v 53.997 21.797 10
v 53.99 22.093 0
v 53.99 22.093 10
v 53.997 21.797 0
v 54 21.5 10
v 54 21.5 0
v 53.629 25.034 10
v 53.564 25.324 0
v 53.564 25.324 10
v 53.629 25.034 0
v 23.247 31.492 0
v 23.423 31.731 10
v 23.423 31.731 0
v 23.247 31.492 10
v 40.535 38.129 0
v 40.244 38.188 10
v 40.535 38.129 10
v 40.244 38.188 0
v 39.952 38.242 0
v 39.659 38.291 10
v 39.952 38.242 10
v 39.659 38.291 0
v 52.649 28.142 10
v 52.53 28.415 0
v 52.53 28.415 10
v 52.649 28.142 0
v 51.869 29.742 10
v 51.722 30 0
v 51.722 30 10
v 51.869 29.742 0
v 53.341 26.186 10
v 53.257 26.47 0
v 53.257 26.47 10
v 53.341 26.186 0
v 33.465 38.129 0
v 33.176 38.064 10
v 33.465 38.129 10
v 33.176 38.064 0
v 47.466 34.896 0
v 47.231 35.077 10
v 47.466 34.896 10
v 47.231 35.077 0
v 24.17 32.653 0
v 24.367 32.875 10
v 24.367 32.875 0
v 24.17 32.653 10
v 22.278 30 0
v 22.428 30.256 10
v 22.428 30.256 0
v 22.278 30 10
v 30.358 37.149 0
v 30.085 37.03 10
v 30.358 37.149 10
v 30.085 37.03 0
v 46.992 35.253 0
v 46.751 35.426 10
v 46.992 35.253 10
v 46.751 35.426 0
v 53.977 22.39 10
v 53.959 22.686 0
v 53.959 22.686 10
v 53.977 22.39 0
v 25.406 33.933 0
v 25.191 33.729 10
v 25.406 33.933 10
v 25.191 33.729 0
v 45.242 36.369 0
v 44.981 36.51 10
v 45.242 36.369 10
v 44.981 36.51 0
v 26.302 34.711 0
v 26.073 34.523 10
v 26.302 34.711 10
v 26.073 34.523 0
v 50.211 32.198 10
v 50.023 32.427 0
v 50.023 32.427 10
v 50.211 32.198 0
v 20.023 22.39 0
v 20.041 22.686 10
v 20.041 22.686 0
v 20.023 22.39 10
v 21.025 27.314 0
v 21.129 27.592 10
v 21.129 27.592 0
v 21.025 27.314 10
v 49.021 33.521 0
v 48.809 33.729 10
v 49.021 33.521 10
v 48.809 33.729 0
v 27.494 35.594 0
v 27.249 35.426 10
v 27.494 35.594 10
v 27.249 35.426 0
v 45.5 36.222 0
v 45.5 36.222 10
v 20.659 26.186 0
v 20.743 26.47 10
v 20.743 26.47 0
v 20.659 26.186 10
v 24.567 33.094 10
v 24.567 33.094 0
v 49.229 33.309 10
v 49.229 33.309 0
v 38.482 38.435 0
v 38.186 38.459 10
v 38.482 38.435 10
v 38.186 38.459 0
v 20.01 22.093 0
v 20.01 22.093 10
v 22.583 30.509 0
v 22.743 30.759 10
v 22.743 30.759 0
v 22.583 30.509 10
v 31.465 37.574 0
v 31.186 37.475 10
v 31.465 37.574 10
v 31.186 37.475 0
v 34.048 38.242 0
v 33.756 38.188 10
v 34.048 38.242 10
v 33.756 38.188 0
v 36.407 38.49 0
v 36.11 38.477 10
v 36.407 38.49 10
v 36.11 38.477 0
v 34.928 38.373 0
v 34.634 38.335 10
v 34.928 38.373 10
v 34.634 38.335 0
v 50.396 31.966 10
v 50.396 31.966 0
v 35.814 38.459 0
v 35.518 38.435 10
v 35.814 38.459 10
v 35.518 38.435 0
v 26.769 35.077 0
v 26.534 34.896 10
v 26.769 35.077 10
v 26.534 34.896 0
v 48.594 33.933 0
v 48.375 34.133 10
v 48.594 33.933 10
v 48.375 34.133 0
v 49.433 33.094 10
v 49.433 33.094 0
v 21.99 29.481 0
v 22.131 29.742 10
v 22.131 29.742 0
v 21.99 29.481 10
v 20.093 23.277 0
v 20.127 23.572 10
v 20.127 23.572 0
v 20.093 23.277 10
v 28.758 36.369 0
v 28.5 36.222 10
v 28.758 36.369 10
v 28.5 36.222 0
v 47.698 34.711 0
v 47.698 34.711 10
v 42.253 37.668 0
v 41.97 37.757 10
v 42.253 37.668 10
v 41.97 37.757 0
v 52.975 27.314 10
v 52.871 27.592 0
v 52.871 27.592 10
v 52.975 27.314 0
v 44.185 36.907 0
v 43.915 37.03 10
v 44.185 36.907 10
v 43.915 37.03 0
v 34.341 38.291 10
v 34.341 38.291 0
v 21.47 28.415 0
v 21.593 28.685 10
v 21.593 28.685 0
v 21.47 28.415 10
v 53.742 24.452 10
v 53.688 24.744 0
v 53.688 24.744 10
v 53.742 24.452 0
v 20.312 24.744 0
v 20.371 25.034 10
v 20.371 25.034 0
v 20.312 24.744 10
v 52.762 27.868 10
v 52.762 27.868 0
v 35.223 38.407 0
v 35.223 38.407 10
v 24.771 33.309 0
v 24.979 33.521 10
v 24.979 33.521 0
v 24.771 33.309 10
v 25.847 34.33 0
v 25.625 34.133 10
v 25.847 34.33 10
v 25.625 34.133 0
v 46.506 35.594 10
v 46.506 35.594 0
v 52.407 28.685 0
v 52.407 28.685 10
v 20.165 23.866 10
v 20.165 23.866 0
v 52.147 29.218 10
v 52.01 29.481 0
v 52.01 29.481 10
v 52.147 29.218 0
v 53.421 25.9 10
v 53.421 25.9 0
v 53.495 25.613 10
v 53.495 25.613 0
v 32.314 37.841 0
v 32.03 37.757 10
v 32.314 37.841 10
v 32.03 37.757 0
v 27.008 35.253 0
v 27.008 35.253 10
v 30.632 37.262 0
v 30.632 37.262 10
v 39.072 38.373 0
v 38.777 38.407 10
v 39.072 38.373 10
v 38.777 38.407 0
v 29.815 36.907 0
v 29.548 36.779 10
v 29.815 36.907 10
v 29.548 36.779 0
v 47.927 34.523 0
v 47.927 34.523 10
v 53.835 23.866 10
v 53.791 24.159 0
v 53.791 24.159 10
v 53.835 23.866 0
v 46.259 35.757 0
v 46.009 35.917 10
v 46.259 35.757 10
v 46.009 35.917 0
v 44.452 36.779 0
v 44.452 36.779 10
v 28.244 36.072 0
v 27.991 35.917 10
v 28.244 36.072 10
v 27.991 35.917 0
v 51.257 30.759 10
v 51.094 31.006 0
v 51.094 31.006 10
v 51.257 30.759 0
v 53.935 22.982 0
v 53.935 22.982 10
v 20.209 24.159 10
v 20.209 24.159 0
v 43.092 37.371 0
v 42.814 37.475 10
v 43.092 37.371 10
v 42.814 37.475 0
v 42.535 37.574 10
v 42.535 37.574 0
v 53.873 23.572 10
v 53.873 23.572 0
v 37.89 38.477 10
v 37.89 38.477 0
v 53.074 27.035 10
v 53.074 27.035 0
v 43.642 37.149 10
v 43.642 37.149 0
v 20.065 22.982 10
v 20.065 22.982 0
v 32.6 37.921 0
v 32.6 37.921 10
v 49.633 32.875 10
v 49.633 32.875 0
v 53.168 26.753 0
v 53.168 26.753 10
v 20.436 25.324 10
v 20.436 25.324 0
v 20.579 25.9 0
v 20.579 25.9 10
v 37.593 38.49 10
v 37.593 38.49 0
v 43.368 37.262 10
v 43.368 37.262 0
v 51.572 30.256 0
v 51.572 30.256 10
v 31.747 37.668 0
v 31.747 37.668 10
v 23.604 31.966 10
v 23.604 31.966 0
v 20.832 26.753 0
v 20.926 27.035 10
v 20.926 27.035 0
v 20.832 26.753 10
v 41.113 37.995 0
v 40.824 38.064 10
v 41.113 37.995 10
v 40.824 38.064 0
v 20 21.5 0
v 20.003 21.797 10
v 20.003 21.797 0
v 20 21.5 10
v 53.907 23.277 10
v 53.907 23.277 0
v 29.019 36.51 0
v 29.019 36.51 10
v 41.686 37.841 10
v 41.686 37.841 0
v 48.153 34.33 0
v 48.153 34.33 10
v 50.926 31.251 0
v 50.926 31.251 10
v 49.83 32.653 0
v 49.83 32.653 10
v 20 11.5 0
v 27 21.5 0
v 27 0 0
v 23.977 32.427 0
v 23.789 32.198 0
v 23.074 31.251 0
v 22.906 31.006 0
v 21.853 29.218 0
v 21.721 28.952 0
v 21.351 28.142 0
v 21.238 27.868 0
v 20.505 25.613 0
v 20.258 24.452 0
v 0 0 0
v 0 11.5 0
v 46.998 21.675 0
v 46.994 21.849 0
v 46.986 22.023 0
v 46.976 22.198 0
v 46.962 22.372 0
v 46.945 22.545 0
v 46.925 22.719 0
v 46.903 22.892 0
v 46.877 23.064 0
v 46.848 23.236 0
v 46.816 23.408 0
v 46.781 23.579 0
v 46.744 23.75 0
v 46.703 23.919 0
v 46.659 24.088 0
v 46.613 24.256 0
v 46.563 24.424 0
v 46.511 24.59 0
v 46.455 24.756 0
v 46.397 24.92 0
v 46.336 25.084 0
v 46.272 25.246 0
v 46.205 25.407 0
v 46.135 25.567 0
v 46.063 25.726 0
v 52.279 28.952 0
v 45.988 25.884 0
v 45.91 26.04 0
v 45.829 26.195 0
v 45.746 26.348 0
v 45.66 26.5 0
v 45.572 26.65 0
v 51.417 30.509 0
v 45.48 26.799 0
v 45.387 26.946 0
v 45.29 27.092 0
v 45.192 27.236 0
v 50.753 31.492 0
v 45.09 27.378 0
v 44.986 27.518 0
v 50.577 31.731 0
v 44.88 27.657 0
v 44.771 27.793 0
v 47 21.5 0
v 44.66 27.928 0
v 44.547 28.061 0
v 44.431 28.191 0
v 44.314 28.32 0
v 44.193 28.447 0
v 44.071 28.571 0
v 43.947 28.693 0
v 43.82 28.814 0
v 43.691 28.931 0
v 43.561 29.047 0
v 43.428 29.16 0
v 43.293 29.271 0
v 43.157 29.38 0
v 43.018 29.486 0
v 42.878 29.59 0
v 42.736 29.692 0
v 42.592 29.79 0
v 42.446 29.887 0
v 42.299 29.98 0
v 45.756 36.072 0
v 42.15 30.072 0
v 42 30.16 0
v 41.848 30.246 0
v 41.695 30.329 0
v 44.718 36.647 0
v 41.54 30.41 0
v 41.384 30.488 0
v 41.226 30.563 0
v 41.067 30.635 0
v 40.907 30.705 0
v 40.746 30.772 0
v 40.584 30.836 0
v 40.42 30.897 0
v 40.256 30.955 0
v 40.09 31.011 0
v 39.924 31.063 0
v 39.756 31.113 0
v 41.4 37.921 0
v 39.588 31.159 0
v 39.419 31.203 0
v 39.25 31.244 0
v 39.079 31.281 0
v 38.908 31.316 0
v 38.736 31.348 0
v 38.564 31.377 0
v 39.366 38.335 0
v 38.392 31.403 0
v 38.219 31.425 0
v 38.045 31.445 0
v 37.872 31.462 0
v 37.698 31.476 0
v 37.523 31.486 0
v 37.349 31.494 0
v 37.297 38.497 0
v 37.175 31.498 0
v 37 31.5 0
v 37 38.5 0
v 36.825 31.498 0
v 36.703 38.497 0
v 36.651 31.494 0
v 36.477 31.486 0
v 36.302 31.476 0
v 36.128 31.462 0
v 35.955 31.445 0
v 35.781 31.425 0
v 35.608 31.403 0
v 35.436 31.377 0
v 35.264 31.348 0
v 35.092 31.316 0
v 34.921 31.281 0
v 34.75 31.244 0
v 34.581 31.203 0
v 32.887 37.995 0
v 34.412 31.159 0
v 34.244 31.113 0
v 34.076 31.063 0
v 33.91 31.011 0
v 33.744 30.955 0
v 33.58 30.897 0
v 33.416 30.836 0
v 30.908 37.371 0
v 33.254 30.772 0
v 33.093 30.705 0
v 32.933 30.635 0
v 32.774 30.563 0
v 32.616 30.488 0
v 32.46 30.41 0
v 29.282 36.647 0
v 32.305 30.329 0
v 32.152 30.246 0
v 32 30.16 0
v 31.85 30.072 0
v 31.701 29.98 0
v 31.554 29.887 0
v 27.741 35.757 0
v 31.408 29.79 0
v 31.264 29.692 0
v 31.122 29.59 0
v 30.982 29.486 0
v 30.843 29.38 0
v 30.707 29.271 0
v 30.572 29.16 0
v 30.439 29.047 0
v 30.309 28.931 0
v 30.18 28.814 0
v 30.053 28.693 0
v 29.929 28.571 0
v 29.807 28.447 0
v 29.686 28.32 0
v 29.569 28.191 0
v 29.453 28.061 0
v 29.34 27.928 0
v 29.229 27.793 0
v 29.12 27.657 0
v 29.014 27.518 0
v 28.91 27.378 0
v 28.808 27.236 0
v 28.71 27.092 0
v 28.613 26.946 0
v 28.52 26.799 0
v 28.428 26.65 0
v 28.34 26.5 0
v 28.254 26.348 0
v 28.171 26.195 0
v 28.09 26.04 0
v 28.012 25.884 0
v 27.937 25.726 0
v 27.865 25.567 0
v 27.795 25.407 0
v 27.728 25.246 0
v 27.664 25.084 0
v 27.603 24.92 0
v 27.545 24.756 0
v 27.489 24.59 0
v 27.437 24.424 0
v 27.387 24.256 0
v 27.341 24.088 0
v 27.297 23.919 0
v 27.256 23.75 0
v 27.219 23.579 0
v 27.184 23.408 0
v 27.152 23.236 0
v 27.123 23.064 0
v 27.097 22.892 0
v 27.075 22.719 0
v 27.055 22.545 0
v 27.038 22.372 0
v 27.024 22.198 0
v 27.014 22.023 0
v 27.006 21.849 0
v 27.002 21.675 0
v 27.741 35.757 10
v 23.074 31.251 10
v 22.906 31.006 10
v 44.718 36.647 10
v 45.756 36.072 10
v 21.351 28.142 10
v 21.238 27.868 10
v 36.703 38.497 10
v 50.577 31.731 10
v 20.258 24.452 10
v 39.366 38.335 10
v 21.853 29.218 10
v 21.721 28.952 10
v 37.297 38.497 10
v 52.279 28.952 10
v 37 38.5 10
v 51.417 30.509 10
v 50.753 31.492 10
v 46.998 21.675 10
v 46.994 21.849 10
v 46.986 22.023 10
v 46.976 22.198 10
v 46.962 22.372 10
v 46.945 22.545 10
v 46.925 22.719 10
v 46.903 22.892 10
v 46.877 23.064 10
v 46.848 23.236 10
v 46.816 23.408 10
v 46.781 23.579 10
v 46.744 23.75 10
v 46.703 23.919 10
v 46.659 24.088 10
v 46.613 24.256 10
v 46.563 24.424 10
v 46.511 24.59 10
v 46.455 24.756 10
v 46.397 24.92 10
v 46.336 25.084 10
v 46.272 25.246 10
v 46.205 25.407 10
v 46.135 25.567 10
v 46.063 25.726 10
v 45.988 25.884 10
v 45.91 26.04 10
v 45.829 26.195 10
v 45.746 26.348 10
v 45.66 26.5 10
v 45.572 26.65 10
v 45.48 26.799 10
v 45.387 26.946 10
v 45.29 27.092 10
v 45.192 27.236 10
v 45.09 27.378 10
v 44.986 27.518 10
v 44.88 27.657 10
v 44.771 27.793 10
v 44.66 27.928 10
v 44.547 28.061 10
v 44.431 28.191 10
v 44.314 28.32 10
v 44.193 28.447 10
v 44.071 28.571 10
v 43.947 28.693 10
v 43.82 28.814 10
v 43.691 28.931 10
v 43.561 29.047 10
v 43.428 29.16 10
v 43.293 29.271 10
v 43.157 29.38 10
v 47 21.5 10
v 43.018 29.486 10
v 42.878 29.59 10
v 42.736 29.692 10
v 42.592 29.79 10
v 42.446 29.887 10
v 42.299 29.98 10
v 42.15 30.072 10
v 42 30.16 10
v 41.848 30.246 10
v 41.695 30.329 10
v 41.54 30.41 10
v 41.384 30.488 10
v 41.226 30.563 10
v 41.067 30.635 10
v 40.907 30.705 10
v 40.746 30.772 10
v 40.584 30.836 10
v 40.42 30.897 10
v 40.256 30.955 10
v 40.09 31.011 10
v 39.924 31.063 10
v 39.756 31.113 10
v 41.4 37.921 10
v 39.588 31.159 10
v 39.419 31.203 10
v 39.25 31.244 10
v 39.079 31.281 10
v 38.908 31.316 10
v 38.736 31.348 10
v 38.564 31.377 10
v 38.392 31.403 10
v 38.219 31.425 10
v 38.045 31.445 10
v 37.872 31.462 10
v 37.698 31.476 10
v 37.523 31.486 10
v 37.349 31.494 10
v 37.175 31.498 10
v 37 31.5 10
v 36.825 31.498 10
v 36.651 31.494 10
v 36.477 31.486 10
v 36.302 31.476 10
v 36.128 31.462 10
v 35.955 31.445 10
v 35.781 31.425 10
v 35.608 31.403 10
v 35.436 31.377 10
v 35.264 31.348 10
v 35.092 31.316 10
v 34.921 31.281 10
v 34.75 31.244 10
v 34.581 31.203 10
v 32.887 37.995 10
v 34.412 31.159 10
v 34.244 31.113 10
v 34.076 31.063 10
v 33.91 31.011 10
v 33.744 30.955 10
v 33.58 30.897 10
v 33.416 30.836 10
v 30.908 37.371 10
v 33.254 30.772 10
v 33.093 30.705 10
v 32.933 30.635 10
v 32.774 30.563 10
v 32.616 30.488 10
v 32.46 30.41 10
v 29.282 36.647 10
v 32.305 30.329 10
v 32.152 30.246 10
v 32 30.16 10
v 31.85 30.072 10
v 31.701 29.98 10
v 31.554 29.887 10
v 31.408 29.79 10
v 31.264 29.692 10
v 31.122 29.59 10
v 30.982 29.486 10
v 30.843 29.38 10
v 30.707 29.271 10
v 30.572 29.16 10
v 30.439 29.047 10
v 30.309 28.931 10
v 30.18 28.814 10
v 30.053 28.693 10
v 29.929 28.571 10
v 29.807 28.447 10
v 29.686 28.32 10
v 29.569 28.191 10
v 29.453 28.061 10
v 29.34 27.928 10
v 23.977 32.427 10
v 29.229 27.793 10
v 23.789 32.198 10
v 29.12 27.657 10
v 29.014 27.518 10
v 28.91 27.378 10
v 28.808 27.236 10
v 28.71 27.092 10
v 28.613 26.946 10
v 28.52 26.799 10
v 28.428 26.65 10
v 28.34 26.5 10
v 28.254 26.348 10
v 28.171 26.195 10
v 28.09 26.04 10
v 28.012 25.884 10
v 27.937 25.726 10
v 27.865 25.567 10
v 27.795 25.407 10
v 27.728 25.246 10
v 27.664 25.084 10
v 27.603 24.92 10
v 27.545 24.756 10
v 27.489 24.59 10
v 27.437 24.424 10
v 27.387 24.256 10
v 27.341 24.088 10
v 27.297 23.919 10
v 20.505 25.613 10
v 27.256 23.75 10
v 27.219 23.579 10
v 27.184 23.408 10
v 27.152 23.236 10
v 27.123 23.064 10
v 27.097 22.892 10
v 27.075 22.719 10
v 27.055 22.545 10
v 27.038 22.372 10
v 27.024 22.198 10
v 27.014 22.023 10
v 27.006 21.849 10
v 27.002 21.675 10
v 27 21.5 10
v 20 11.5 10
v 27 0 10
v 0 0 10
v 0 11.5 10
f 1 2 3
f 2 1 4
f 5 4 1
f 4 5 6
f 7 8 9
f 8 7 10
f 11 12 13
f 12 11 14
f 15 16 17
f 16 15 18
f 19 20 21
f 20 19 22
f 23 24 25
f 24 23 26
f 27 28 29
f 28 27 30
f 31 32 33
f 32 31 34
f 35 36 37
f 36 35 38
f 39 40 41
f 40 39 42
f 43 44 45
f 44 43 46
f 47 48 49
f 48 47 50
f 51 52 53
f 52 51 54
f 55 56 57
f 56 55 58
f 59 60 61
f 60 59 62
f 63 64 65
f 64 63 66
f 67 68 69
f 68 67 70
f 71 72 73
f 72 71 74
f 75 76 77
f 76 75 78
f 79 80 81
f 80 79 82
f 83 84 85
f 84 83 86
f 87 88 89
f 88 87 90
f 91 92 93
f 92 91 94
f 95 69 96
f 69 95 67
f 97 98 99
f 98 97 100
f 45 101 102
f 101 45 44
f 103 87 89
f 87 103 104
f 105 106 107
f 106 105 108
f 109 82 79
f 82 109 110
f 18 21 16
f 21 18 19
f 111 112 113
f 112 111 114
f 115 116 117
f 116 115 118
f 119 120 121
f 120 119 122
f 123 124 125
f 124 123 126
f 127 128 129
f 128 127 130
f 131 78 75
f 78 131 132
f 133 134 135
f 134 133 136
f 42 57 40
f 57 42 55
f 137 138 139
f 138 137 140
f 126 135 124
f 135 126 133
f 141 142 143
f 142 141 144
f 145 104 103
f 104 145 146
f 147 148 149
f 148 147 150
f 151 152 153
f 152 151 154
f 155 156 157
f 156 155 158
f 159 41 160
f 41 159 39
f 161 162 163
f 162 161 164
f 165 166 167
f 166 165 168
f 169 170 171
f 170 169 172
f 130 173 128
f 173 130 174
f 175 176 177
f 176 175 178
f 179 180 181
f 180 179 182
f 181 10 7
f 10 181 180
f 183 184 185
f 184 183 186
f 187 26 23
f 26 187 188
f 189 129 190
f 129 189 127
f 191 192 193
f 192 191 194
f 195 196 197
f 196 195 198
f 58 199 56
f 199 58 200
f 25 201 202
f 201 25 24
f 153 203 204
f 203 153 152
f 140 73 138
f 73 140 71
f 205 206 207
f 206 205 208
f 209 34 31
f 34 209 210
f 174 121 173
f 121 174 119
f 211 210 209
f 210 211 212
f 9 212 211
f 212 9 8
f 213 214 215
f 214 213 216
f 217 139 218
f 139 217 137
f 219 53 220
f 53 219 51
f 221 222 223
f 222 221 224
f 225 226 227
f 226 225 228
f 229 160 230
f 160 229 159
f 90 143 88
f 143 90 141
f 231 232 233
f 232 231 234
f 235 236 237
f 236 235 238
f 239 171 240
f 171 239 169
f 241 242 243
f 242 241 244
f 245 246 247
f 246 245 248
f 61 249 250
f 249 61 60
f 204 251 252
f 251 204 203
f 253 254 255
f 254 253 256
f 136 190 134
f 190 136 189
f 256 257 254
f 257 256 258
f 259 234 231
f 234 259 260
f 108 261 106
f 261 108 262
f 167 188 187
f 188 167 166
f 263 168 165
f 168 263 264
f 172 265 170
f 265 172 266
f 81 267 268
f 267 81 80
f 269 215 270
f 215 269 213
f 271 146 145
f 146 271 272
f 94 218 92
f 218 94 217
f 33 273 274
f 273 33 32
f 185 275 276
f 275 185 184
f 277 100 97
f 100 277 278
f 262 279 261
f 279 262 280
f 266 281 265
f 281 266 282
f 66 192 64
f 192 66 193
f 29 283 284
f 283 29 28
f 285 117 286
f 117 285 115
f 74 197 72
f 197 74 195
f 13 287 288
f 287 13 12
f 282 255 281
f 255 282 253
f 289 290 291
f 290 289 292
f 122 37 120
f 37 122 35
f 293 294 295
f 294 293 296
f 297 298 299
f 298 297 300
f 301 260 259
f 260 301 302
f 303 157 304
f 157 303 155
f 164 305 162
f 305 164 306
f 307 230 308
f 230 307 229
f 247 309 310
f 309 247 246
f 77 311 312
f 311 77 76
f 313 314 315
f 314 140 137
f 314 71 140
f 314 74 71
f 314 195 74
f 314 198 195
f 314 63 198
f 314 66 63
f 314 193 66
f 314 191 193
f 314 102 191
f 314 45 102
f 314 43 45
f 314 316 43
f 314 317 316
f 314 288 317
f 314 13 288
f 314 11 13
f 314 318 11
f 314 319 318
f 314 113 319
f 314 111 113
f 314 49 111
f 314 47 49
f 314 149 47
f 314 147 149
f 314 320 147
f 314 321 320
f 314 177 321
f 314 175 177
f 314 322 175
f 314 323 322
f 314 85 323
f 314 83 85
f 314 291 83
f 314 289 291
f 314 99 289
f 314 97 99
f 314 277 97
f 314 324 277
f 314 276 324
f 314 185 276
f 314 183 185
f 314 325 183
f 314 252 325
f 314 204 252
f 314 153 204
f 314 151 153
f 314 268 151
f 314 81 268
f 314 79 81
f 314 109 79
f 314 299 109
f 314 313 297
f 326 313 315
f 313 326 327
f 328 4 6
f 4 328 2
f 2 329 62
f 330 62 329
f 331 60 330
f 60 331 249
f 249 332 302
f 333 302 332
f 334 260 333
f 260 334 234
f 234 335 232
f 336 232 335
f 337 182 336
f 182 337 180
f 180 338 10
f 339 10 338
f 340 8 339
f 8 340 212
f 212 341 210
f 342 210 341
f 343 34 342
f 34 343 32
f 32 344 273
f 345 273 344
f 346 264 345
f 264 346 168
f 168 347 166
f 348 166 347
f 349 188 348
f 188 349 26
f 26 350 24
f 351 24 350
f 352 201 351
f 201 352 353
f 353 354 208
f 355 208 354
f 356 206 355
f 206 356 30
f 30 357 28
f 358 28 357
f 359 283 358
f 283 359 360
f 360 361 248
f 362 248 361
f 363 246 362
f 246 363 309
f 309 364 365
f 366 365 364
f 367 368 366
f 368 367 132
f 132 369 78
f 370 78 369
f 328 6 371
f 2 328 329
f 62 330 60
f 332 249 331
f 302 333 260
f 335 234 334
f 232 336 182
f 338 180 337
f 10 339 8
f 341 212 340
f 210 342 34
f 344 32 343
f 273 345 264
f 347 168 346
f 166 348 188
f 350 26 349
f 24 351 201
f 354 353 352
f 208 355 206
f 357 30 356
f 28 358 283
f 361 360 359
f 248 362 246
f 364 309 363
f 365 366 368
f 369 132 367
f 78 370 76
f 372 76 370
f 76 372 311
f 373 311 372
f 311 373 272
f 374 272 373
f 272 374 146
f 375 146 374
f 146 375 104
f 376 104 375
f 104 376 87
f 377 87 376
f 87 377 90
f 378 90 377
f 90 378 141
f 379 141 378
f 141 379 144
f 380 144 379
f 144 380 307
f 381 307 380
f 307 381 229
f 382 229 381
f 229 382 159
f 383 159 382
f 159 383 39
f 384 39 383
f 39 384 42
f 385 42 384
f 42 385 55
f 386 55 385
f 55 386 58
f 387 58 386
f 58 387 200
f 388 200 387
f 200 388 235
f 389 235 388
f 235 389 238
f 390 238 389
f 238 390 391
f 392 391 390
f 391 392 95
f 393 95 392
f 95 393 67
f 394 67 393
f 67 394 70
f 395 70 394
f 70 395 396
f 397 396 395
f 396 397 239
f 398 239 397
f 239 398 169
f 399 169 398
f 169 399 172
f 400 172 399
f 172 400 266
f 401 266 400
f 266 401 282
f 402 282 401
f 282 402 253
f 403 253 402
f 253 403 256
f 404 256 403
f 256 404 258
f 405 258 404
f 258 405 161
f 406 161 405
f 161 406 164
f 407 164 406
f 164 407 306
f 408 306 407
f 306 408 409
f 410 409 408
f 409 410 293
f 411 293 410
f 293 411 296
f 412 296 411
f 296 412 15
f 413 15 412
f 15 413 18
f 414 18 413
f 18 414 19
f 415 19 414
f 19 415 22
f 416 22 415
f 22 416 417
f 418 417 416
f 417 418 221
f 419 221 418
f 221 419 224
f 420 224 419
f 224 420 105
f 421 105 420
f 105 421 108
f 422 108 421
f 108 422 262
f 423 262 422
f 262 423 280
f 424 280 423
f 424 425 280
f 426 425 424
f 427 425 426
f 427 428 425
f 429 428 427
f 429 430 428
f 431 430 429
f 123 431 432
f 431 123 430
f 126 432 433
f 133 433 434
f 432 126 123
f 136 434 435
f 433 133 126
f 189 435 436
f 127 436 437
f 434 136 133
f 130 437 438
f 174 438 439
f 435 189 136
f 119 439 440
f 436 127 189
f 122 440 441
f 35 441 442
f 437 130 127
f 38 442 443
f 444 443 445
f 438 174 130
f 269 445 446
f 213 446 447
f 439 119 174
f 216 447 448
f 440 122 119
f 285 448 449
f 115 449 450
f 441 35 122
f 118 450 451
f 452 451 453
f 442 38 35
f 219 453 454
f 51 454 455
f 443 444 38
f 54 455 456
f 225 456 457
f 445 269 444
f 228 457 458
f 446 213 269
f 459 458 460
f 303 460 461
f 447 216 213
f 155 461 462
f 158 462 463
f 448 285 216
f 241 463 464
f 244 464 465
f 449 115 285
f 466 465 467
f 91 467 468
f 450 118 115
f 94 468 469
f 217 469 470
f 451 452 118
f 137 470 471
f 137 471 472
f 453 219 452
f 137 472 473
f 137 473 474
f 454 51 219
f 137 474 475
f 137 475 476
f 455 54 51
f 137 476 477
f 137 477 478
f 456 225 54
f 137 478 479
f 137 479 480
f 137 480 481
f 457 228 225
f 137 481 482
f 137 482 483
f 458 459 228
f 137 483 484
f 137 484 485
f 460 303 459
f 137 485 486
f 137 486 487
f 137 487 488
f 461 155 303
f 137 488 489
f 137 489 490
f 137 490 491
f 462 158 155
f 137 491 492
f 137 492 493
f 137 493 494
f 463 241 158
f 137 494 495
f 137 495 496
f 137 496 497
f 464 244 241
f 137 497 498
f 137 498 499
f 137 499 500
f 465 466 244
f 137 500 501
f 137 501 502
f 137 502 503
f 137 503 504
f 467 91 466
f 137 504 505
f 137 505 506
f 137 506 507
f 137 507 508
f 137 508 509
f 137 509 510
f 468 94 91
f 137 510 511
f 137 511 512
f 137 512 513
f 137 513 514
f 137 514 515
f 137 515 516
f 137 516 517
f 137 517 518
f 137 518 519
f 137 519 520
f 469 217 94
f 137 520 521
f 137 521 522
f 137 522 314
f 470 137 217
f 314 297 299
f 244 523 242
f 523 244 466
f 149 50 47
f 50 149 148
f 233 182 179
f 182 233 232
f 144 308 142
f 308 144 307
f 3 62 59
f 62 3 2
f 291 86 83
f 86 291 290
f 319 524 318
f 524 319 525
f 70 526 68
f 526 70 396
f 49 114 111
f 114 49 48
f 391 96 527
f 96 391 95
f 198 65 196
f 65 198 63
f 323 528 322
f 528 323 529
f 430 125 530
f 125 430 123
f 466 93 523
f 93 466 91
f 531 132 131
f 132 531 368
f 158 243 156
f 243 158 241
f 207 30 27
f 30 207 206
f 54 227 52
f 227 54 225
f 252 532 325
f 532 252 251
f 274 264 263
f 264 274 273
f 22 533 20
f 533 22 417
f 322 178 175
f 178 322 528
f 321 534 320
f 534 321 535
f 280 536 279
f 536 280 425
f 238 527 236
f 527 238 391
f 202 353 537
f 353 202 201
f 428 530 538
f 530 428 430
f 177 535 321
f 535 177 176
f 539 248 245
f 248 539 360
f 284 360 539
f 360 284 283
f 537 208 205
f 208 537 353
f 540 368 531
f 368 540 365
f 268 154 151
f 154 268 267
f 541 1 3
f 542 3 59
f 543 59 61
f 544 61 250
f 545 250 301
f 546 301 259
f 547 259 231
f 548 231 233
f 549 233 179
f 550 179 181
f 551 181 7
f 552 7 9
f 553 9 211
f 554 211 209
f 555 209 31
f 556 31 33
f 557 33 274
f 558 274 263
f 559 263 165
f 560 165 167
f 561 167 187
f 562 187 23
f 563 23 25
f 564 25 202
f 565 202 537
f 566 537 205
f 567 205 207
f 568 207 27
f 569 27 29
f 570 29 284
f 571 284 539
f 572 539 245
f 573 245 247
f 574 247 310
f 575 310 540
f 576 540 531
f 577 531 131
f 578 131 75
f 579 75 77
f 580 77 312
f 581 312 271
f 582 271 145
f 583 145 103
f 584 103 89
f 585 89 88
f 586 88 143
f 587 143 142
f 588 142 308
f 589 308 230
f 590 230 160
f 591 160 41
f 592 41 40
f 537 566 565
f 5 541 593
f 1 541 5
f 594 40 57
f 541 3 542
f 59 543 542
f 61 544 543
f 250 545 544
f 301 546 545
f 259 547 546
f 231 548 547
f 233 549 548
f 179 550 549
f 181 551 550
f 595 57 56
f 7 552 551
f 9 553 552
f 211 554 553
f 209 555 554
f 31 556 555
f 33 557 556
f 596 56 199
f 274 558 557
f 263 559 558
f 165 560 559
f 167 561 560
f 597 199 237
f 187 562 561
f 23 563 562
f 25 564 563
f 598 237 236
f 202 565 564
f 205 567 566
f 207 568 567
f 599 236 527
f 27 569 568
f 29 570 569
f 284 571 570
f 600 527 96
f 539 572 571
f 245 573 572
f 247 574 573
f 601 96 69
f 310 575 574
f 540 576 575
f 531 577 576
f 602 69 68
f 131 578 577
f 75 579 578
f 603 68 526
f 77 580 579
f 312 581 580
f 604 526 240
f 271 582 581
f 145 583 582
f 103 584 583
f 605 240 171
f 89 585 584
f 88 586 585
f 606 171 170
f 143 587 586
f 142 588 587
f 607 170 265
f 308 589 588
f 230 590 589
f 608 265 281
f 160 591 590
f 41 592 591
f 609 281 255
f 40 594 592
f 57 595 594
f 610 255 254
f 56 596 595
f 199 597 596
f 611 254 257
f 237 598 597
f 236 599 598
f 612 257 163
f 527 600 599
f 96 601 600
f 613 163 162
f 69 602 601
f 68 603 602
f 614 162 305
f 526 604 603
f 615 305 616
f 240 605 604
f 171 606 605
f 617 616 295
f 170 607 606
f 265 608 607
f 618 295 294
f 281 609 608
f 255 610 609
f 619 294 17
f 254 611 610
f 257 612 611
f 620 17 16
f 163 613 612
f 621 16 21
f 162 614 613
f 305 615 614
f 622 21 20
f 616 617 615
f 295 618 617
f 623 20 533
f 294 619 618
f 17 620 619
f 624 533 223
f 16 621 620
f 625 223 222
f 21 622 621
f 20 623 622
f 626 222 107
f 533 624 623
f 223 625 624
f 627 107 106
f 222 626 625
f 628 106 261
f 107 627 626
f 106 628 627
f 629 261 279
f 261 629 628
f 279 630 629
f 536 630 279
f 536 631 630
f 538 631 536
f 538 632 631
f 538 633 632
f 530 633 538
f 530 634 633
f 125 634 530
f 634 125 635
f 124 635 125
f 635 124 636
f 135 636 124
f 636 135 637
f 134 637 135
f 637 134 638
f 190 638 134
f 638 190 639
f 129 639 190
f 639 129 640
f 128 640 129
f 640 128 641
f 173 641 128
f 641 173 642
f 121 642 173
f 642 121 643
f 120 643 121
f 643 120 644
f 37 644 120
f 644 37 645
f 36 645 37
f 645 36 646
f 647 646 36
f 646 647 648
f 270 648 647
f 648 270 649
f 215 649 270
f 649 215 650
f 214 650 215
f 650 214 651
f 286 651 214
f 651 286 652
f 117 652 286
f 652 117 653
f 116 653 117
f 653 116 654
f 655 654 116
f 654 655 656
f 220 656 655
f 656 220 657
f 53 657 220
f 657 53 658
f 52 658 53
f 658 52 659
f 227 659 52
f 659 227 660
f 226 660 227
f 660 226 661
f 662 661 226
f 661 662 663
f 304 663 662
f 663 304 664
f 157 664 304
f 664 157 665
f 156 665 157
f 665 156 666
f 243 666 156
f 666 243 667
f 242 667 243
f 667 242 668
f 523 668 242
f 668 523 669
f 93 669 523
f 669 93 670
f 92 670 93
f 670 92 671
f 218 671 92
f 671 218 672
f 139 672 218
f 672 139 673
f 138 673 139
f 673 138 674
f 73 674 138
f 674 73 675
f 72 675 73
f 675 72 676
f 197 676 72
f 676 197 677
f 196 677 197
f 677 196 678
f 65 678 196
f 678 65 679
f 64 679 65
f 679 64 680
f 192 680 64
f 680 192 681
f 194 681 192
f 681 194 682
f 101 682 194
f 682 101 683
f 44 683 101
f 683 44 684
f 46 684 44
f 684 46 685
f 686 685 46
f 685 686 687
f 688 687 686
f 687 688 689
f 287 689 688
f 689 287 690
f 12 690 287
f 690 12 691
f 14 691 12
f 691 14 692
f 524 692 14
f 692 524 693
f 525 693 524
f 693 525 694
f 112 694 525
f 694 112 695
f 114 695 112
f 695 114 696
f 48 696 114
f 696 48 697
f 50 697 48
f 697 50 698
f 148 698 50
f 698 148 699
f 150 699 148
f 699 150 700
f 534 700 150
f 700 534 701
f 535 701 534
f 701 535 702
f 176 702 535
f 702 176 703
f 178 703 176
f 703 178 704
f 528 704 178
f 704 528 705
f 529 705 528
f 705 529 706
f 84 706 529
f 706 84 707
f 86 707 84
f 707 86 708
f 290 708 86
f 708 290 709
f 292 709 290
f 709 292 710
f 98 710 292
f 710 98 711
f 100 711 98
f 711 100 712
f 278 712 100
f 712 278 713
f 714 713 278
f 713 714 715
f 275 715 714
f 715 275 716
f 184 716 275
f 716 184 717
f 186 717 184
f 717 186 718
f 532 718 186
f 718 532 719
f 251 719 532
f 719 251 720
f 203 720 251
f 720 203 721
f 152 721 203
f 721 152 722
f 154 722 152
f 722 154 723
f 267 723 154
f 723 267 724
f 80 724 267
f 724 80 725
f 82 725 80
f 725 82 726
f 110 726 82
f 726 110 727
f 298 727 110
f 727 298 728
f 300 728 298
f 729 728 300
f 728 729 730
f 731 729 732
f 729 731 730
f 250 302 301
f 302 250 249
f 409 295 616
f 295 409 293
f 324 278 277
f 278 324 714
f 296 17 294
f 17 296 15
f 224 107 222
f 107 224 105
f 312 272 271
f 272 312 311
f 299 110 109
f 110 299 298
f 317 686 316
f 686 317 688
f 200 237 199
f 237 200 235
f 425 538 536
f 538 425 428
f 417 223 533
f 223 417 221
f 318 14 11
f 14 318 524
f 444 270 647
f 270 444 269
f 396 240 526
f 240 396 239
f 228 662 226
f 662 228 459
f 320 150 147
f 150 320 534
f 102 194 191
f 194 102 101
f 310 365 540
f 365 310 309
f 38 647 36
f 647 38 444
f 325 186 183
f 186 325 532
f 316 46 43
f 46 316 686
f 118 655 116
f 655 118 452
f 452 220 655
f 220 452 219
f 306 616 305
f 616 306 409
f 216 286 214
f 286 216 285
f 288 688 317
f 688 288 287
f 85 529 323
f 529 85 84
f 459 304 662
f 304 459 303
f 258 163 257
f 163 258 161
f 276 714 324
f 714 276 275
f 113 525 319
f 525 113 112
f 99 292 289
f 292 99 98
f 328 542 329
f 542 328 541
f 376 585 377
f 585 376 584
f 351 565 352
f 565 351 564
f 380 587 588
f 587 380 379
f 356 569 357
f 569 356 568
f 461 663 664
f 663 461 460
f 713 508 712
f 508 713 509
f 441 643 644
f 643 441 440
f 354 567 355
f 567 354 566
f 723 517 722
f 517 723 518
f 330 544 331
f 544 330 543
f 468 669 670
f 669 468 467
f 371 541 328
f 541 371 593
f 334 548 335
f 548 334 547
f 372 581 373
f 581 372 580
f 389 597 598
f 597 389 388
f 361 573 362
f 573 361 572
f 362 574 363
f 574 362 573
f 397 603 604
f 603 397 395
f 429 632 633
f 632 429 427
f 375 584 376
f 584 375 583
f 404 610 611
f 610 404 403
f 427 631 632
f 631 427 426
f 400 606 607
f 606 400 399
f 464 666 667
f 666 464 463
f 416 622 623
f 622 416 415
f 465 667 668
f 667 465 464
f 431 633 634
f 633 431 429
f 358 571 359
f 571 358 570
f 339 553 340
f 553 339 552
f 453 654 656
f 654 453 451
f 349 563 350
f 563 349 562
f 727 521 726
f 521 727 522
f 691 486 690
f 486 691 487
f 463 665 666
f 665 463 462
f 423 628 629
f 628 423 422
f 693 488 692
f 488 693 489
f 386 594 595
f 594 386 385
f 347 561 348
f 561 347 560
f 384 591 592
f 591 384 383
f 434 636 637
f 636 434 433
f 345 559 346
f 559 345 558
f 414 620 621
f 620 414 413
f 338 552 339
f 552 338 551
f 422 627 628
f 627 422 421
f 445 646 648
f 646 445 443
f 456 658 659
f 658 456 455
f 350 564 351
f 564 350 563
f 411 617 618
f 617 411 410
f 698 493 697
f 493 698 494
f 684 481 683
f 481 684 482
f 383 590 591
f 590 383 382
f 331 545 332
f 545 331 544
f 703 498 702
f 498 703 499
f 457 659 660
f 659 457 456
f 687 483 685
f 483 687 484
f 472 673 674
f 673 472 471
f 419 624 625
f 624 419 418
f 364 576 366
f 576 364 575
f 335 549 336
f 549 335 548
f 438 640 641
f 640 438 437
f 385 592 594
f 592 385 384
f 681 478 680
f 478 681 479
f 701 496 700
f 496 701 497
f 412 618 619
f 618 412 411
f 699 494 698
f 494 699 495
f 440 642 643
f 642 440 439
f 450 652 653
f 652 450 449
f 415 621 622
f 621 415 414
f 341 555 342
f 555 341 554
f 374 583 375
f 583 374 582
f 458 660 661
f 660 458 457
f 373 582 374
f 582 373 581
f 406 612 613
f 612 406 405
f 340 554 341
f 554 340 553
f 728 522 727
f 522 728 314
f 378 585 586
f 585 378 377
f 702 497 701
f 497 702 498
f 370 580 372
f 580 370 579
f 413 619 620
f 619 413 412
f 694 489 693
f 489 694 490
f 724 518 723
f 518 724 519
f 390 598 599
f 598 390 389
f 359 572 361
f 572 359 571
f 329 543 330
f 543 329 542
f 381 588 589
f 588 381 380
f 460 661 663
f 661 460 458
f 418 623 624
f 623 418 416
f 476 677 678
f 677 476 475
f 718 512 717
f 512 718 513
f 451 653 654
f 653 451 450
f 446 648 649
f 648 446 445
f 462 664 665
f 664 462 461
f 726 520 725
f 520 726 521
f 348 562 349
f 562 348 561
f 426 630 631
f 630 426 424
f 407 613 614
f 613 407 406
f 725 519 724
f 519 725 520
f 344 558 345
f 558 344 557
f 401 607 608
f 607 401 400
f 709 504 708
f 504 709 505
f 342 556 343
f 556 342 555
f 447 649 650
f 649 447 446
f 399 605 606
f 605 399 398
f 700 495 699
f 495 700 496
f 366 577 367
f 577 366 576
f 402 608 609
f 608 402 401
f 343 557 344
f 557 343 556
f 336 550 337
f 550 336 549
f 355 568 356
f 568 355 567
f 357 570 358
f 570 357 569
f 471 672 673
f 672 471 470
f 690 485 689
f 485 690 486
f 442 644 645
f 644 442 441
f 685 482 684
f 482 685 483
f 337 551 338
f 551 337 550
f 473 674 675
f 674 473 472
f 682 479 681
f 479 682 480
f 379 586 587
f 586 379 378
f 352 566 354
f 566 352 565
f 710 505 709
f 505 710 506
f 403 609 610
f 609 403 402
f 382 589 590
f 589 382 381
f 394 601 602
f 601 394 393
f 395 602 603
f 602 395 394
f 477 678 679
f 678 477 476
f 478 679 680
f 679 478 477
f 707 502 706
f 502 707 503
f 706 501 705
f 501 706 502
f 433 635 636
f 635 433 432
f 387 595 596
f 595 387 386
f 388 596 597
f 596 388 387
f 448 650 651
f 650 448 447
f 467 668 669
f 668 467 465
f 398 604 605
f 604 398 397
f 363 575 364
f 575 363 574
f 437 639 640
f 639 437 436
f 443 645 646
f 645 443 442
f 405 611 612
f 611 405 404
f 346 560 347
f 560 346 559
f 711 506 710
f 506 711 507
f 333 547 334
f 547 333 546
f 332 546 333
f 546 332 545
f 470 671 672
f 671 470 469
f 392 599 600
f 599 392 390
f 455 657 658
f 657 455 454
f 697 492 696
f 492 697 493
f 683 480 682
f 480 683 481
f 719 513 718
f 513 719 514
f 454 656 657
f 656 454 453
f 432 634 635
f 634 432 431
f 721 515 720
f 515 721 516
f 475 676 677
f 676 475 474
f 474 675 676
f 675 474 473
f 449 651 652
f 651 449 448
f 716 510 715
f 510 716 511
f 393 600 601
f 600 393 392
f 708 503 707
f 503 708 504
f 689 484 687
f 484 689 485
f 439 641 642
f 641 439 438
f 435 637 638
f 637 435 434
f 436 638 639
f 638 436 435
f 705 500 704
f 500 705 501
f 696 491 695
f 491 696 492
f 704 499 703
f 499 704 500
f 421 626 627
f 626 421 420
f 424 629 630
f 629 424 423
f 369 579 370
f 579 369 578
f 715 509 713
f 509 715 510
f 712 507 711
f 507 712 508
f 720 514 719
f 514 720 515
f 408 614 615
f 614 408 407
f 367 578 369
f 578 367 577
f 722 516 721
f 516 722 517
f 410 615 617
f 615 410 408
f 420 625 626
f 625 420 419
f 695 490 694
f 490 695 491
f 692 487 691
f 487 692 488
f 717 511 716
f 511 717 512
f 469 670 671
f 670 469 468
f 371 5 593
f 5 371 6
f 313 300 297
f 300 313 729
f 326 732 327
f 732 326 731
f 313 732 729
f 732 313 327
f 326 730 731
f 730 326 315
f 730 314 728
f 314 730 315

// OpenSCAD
width = 10;
gap_size = 11.5;
grab_depth = 20;
thickness = 7;
radius = 10;
$fn = 360;

cube([grab_depth, gap_size, width]);
translate([grab_depth, 0, 0]) {
    cube([thickness, gap_size + radius, width]);
}
translate([grab_depth + thickness + radius, gap_size + radius, 0]) {
    difference() {
        cylinder(r = radius + thickness, h = width);
        cylinder(r = radius, h = width);
        translate([-radius - thickness, -radius - thickness, 0]) {
            cube([(radius + thickness) * 2, radius + thickness, width]);
        }
    }
}
